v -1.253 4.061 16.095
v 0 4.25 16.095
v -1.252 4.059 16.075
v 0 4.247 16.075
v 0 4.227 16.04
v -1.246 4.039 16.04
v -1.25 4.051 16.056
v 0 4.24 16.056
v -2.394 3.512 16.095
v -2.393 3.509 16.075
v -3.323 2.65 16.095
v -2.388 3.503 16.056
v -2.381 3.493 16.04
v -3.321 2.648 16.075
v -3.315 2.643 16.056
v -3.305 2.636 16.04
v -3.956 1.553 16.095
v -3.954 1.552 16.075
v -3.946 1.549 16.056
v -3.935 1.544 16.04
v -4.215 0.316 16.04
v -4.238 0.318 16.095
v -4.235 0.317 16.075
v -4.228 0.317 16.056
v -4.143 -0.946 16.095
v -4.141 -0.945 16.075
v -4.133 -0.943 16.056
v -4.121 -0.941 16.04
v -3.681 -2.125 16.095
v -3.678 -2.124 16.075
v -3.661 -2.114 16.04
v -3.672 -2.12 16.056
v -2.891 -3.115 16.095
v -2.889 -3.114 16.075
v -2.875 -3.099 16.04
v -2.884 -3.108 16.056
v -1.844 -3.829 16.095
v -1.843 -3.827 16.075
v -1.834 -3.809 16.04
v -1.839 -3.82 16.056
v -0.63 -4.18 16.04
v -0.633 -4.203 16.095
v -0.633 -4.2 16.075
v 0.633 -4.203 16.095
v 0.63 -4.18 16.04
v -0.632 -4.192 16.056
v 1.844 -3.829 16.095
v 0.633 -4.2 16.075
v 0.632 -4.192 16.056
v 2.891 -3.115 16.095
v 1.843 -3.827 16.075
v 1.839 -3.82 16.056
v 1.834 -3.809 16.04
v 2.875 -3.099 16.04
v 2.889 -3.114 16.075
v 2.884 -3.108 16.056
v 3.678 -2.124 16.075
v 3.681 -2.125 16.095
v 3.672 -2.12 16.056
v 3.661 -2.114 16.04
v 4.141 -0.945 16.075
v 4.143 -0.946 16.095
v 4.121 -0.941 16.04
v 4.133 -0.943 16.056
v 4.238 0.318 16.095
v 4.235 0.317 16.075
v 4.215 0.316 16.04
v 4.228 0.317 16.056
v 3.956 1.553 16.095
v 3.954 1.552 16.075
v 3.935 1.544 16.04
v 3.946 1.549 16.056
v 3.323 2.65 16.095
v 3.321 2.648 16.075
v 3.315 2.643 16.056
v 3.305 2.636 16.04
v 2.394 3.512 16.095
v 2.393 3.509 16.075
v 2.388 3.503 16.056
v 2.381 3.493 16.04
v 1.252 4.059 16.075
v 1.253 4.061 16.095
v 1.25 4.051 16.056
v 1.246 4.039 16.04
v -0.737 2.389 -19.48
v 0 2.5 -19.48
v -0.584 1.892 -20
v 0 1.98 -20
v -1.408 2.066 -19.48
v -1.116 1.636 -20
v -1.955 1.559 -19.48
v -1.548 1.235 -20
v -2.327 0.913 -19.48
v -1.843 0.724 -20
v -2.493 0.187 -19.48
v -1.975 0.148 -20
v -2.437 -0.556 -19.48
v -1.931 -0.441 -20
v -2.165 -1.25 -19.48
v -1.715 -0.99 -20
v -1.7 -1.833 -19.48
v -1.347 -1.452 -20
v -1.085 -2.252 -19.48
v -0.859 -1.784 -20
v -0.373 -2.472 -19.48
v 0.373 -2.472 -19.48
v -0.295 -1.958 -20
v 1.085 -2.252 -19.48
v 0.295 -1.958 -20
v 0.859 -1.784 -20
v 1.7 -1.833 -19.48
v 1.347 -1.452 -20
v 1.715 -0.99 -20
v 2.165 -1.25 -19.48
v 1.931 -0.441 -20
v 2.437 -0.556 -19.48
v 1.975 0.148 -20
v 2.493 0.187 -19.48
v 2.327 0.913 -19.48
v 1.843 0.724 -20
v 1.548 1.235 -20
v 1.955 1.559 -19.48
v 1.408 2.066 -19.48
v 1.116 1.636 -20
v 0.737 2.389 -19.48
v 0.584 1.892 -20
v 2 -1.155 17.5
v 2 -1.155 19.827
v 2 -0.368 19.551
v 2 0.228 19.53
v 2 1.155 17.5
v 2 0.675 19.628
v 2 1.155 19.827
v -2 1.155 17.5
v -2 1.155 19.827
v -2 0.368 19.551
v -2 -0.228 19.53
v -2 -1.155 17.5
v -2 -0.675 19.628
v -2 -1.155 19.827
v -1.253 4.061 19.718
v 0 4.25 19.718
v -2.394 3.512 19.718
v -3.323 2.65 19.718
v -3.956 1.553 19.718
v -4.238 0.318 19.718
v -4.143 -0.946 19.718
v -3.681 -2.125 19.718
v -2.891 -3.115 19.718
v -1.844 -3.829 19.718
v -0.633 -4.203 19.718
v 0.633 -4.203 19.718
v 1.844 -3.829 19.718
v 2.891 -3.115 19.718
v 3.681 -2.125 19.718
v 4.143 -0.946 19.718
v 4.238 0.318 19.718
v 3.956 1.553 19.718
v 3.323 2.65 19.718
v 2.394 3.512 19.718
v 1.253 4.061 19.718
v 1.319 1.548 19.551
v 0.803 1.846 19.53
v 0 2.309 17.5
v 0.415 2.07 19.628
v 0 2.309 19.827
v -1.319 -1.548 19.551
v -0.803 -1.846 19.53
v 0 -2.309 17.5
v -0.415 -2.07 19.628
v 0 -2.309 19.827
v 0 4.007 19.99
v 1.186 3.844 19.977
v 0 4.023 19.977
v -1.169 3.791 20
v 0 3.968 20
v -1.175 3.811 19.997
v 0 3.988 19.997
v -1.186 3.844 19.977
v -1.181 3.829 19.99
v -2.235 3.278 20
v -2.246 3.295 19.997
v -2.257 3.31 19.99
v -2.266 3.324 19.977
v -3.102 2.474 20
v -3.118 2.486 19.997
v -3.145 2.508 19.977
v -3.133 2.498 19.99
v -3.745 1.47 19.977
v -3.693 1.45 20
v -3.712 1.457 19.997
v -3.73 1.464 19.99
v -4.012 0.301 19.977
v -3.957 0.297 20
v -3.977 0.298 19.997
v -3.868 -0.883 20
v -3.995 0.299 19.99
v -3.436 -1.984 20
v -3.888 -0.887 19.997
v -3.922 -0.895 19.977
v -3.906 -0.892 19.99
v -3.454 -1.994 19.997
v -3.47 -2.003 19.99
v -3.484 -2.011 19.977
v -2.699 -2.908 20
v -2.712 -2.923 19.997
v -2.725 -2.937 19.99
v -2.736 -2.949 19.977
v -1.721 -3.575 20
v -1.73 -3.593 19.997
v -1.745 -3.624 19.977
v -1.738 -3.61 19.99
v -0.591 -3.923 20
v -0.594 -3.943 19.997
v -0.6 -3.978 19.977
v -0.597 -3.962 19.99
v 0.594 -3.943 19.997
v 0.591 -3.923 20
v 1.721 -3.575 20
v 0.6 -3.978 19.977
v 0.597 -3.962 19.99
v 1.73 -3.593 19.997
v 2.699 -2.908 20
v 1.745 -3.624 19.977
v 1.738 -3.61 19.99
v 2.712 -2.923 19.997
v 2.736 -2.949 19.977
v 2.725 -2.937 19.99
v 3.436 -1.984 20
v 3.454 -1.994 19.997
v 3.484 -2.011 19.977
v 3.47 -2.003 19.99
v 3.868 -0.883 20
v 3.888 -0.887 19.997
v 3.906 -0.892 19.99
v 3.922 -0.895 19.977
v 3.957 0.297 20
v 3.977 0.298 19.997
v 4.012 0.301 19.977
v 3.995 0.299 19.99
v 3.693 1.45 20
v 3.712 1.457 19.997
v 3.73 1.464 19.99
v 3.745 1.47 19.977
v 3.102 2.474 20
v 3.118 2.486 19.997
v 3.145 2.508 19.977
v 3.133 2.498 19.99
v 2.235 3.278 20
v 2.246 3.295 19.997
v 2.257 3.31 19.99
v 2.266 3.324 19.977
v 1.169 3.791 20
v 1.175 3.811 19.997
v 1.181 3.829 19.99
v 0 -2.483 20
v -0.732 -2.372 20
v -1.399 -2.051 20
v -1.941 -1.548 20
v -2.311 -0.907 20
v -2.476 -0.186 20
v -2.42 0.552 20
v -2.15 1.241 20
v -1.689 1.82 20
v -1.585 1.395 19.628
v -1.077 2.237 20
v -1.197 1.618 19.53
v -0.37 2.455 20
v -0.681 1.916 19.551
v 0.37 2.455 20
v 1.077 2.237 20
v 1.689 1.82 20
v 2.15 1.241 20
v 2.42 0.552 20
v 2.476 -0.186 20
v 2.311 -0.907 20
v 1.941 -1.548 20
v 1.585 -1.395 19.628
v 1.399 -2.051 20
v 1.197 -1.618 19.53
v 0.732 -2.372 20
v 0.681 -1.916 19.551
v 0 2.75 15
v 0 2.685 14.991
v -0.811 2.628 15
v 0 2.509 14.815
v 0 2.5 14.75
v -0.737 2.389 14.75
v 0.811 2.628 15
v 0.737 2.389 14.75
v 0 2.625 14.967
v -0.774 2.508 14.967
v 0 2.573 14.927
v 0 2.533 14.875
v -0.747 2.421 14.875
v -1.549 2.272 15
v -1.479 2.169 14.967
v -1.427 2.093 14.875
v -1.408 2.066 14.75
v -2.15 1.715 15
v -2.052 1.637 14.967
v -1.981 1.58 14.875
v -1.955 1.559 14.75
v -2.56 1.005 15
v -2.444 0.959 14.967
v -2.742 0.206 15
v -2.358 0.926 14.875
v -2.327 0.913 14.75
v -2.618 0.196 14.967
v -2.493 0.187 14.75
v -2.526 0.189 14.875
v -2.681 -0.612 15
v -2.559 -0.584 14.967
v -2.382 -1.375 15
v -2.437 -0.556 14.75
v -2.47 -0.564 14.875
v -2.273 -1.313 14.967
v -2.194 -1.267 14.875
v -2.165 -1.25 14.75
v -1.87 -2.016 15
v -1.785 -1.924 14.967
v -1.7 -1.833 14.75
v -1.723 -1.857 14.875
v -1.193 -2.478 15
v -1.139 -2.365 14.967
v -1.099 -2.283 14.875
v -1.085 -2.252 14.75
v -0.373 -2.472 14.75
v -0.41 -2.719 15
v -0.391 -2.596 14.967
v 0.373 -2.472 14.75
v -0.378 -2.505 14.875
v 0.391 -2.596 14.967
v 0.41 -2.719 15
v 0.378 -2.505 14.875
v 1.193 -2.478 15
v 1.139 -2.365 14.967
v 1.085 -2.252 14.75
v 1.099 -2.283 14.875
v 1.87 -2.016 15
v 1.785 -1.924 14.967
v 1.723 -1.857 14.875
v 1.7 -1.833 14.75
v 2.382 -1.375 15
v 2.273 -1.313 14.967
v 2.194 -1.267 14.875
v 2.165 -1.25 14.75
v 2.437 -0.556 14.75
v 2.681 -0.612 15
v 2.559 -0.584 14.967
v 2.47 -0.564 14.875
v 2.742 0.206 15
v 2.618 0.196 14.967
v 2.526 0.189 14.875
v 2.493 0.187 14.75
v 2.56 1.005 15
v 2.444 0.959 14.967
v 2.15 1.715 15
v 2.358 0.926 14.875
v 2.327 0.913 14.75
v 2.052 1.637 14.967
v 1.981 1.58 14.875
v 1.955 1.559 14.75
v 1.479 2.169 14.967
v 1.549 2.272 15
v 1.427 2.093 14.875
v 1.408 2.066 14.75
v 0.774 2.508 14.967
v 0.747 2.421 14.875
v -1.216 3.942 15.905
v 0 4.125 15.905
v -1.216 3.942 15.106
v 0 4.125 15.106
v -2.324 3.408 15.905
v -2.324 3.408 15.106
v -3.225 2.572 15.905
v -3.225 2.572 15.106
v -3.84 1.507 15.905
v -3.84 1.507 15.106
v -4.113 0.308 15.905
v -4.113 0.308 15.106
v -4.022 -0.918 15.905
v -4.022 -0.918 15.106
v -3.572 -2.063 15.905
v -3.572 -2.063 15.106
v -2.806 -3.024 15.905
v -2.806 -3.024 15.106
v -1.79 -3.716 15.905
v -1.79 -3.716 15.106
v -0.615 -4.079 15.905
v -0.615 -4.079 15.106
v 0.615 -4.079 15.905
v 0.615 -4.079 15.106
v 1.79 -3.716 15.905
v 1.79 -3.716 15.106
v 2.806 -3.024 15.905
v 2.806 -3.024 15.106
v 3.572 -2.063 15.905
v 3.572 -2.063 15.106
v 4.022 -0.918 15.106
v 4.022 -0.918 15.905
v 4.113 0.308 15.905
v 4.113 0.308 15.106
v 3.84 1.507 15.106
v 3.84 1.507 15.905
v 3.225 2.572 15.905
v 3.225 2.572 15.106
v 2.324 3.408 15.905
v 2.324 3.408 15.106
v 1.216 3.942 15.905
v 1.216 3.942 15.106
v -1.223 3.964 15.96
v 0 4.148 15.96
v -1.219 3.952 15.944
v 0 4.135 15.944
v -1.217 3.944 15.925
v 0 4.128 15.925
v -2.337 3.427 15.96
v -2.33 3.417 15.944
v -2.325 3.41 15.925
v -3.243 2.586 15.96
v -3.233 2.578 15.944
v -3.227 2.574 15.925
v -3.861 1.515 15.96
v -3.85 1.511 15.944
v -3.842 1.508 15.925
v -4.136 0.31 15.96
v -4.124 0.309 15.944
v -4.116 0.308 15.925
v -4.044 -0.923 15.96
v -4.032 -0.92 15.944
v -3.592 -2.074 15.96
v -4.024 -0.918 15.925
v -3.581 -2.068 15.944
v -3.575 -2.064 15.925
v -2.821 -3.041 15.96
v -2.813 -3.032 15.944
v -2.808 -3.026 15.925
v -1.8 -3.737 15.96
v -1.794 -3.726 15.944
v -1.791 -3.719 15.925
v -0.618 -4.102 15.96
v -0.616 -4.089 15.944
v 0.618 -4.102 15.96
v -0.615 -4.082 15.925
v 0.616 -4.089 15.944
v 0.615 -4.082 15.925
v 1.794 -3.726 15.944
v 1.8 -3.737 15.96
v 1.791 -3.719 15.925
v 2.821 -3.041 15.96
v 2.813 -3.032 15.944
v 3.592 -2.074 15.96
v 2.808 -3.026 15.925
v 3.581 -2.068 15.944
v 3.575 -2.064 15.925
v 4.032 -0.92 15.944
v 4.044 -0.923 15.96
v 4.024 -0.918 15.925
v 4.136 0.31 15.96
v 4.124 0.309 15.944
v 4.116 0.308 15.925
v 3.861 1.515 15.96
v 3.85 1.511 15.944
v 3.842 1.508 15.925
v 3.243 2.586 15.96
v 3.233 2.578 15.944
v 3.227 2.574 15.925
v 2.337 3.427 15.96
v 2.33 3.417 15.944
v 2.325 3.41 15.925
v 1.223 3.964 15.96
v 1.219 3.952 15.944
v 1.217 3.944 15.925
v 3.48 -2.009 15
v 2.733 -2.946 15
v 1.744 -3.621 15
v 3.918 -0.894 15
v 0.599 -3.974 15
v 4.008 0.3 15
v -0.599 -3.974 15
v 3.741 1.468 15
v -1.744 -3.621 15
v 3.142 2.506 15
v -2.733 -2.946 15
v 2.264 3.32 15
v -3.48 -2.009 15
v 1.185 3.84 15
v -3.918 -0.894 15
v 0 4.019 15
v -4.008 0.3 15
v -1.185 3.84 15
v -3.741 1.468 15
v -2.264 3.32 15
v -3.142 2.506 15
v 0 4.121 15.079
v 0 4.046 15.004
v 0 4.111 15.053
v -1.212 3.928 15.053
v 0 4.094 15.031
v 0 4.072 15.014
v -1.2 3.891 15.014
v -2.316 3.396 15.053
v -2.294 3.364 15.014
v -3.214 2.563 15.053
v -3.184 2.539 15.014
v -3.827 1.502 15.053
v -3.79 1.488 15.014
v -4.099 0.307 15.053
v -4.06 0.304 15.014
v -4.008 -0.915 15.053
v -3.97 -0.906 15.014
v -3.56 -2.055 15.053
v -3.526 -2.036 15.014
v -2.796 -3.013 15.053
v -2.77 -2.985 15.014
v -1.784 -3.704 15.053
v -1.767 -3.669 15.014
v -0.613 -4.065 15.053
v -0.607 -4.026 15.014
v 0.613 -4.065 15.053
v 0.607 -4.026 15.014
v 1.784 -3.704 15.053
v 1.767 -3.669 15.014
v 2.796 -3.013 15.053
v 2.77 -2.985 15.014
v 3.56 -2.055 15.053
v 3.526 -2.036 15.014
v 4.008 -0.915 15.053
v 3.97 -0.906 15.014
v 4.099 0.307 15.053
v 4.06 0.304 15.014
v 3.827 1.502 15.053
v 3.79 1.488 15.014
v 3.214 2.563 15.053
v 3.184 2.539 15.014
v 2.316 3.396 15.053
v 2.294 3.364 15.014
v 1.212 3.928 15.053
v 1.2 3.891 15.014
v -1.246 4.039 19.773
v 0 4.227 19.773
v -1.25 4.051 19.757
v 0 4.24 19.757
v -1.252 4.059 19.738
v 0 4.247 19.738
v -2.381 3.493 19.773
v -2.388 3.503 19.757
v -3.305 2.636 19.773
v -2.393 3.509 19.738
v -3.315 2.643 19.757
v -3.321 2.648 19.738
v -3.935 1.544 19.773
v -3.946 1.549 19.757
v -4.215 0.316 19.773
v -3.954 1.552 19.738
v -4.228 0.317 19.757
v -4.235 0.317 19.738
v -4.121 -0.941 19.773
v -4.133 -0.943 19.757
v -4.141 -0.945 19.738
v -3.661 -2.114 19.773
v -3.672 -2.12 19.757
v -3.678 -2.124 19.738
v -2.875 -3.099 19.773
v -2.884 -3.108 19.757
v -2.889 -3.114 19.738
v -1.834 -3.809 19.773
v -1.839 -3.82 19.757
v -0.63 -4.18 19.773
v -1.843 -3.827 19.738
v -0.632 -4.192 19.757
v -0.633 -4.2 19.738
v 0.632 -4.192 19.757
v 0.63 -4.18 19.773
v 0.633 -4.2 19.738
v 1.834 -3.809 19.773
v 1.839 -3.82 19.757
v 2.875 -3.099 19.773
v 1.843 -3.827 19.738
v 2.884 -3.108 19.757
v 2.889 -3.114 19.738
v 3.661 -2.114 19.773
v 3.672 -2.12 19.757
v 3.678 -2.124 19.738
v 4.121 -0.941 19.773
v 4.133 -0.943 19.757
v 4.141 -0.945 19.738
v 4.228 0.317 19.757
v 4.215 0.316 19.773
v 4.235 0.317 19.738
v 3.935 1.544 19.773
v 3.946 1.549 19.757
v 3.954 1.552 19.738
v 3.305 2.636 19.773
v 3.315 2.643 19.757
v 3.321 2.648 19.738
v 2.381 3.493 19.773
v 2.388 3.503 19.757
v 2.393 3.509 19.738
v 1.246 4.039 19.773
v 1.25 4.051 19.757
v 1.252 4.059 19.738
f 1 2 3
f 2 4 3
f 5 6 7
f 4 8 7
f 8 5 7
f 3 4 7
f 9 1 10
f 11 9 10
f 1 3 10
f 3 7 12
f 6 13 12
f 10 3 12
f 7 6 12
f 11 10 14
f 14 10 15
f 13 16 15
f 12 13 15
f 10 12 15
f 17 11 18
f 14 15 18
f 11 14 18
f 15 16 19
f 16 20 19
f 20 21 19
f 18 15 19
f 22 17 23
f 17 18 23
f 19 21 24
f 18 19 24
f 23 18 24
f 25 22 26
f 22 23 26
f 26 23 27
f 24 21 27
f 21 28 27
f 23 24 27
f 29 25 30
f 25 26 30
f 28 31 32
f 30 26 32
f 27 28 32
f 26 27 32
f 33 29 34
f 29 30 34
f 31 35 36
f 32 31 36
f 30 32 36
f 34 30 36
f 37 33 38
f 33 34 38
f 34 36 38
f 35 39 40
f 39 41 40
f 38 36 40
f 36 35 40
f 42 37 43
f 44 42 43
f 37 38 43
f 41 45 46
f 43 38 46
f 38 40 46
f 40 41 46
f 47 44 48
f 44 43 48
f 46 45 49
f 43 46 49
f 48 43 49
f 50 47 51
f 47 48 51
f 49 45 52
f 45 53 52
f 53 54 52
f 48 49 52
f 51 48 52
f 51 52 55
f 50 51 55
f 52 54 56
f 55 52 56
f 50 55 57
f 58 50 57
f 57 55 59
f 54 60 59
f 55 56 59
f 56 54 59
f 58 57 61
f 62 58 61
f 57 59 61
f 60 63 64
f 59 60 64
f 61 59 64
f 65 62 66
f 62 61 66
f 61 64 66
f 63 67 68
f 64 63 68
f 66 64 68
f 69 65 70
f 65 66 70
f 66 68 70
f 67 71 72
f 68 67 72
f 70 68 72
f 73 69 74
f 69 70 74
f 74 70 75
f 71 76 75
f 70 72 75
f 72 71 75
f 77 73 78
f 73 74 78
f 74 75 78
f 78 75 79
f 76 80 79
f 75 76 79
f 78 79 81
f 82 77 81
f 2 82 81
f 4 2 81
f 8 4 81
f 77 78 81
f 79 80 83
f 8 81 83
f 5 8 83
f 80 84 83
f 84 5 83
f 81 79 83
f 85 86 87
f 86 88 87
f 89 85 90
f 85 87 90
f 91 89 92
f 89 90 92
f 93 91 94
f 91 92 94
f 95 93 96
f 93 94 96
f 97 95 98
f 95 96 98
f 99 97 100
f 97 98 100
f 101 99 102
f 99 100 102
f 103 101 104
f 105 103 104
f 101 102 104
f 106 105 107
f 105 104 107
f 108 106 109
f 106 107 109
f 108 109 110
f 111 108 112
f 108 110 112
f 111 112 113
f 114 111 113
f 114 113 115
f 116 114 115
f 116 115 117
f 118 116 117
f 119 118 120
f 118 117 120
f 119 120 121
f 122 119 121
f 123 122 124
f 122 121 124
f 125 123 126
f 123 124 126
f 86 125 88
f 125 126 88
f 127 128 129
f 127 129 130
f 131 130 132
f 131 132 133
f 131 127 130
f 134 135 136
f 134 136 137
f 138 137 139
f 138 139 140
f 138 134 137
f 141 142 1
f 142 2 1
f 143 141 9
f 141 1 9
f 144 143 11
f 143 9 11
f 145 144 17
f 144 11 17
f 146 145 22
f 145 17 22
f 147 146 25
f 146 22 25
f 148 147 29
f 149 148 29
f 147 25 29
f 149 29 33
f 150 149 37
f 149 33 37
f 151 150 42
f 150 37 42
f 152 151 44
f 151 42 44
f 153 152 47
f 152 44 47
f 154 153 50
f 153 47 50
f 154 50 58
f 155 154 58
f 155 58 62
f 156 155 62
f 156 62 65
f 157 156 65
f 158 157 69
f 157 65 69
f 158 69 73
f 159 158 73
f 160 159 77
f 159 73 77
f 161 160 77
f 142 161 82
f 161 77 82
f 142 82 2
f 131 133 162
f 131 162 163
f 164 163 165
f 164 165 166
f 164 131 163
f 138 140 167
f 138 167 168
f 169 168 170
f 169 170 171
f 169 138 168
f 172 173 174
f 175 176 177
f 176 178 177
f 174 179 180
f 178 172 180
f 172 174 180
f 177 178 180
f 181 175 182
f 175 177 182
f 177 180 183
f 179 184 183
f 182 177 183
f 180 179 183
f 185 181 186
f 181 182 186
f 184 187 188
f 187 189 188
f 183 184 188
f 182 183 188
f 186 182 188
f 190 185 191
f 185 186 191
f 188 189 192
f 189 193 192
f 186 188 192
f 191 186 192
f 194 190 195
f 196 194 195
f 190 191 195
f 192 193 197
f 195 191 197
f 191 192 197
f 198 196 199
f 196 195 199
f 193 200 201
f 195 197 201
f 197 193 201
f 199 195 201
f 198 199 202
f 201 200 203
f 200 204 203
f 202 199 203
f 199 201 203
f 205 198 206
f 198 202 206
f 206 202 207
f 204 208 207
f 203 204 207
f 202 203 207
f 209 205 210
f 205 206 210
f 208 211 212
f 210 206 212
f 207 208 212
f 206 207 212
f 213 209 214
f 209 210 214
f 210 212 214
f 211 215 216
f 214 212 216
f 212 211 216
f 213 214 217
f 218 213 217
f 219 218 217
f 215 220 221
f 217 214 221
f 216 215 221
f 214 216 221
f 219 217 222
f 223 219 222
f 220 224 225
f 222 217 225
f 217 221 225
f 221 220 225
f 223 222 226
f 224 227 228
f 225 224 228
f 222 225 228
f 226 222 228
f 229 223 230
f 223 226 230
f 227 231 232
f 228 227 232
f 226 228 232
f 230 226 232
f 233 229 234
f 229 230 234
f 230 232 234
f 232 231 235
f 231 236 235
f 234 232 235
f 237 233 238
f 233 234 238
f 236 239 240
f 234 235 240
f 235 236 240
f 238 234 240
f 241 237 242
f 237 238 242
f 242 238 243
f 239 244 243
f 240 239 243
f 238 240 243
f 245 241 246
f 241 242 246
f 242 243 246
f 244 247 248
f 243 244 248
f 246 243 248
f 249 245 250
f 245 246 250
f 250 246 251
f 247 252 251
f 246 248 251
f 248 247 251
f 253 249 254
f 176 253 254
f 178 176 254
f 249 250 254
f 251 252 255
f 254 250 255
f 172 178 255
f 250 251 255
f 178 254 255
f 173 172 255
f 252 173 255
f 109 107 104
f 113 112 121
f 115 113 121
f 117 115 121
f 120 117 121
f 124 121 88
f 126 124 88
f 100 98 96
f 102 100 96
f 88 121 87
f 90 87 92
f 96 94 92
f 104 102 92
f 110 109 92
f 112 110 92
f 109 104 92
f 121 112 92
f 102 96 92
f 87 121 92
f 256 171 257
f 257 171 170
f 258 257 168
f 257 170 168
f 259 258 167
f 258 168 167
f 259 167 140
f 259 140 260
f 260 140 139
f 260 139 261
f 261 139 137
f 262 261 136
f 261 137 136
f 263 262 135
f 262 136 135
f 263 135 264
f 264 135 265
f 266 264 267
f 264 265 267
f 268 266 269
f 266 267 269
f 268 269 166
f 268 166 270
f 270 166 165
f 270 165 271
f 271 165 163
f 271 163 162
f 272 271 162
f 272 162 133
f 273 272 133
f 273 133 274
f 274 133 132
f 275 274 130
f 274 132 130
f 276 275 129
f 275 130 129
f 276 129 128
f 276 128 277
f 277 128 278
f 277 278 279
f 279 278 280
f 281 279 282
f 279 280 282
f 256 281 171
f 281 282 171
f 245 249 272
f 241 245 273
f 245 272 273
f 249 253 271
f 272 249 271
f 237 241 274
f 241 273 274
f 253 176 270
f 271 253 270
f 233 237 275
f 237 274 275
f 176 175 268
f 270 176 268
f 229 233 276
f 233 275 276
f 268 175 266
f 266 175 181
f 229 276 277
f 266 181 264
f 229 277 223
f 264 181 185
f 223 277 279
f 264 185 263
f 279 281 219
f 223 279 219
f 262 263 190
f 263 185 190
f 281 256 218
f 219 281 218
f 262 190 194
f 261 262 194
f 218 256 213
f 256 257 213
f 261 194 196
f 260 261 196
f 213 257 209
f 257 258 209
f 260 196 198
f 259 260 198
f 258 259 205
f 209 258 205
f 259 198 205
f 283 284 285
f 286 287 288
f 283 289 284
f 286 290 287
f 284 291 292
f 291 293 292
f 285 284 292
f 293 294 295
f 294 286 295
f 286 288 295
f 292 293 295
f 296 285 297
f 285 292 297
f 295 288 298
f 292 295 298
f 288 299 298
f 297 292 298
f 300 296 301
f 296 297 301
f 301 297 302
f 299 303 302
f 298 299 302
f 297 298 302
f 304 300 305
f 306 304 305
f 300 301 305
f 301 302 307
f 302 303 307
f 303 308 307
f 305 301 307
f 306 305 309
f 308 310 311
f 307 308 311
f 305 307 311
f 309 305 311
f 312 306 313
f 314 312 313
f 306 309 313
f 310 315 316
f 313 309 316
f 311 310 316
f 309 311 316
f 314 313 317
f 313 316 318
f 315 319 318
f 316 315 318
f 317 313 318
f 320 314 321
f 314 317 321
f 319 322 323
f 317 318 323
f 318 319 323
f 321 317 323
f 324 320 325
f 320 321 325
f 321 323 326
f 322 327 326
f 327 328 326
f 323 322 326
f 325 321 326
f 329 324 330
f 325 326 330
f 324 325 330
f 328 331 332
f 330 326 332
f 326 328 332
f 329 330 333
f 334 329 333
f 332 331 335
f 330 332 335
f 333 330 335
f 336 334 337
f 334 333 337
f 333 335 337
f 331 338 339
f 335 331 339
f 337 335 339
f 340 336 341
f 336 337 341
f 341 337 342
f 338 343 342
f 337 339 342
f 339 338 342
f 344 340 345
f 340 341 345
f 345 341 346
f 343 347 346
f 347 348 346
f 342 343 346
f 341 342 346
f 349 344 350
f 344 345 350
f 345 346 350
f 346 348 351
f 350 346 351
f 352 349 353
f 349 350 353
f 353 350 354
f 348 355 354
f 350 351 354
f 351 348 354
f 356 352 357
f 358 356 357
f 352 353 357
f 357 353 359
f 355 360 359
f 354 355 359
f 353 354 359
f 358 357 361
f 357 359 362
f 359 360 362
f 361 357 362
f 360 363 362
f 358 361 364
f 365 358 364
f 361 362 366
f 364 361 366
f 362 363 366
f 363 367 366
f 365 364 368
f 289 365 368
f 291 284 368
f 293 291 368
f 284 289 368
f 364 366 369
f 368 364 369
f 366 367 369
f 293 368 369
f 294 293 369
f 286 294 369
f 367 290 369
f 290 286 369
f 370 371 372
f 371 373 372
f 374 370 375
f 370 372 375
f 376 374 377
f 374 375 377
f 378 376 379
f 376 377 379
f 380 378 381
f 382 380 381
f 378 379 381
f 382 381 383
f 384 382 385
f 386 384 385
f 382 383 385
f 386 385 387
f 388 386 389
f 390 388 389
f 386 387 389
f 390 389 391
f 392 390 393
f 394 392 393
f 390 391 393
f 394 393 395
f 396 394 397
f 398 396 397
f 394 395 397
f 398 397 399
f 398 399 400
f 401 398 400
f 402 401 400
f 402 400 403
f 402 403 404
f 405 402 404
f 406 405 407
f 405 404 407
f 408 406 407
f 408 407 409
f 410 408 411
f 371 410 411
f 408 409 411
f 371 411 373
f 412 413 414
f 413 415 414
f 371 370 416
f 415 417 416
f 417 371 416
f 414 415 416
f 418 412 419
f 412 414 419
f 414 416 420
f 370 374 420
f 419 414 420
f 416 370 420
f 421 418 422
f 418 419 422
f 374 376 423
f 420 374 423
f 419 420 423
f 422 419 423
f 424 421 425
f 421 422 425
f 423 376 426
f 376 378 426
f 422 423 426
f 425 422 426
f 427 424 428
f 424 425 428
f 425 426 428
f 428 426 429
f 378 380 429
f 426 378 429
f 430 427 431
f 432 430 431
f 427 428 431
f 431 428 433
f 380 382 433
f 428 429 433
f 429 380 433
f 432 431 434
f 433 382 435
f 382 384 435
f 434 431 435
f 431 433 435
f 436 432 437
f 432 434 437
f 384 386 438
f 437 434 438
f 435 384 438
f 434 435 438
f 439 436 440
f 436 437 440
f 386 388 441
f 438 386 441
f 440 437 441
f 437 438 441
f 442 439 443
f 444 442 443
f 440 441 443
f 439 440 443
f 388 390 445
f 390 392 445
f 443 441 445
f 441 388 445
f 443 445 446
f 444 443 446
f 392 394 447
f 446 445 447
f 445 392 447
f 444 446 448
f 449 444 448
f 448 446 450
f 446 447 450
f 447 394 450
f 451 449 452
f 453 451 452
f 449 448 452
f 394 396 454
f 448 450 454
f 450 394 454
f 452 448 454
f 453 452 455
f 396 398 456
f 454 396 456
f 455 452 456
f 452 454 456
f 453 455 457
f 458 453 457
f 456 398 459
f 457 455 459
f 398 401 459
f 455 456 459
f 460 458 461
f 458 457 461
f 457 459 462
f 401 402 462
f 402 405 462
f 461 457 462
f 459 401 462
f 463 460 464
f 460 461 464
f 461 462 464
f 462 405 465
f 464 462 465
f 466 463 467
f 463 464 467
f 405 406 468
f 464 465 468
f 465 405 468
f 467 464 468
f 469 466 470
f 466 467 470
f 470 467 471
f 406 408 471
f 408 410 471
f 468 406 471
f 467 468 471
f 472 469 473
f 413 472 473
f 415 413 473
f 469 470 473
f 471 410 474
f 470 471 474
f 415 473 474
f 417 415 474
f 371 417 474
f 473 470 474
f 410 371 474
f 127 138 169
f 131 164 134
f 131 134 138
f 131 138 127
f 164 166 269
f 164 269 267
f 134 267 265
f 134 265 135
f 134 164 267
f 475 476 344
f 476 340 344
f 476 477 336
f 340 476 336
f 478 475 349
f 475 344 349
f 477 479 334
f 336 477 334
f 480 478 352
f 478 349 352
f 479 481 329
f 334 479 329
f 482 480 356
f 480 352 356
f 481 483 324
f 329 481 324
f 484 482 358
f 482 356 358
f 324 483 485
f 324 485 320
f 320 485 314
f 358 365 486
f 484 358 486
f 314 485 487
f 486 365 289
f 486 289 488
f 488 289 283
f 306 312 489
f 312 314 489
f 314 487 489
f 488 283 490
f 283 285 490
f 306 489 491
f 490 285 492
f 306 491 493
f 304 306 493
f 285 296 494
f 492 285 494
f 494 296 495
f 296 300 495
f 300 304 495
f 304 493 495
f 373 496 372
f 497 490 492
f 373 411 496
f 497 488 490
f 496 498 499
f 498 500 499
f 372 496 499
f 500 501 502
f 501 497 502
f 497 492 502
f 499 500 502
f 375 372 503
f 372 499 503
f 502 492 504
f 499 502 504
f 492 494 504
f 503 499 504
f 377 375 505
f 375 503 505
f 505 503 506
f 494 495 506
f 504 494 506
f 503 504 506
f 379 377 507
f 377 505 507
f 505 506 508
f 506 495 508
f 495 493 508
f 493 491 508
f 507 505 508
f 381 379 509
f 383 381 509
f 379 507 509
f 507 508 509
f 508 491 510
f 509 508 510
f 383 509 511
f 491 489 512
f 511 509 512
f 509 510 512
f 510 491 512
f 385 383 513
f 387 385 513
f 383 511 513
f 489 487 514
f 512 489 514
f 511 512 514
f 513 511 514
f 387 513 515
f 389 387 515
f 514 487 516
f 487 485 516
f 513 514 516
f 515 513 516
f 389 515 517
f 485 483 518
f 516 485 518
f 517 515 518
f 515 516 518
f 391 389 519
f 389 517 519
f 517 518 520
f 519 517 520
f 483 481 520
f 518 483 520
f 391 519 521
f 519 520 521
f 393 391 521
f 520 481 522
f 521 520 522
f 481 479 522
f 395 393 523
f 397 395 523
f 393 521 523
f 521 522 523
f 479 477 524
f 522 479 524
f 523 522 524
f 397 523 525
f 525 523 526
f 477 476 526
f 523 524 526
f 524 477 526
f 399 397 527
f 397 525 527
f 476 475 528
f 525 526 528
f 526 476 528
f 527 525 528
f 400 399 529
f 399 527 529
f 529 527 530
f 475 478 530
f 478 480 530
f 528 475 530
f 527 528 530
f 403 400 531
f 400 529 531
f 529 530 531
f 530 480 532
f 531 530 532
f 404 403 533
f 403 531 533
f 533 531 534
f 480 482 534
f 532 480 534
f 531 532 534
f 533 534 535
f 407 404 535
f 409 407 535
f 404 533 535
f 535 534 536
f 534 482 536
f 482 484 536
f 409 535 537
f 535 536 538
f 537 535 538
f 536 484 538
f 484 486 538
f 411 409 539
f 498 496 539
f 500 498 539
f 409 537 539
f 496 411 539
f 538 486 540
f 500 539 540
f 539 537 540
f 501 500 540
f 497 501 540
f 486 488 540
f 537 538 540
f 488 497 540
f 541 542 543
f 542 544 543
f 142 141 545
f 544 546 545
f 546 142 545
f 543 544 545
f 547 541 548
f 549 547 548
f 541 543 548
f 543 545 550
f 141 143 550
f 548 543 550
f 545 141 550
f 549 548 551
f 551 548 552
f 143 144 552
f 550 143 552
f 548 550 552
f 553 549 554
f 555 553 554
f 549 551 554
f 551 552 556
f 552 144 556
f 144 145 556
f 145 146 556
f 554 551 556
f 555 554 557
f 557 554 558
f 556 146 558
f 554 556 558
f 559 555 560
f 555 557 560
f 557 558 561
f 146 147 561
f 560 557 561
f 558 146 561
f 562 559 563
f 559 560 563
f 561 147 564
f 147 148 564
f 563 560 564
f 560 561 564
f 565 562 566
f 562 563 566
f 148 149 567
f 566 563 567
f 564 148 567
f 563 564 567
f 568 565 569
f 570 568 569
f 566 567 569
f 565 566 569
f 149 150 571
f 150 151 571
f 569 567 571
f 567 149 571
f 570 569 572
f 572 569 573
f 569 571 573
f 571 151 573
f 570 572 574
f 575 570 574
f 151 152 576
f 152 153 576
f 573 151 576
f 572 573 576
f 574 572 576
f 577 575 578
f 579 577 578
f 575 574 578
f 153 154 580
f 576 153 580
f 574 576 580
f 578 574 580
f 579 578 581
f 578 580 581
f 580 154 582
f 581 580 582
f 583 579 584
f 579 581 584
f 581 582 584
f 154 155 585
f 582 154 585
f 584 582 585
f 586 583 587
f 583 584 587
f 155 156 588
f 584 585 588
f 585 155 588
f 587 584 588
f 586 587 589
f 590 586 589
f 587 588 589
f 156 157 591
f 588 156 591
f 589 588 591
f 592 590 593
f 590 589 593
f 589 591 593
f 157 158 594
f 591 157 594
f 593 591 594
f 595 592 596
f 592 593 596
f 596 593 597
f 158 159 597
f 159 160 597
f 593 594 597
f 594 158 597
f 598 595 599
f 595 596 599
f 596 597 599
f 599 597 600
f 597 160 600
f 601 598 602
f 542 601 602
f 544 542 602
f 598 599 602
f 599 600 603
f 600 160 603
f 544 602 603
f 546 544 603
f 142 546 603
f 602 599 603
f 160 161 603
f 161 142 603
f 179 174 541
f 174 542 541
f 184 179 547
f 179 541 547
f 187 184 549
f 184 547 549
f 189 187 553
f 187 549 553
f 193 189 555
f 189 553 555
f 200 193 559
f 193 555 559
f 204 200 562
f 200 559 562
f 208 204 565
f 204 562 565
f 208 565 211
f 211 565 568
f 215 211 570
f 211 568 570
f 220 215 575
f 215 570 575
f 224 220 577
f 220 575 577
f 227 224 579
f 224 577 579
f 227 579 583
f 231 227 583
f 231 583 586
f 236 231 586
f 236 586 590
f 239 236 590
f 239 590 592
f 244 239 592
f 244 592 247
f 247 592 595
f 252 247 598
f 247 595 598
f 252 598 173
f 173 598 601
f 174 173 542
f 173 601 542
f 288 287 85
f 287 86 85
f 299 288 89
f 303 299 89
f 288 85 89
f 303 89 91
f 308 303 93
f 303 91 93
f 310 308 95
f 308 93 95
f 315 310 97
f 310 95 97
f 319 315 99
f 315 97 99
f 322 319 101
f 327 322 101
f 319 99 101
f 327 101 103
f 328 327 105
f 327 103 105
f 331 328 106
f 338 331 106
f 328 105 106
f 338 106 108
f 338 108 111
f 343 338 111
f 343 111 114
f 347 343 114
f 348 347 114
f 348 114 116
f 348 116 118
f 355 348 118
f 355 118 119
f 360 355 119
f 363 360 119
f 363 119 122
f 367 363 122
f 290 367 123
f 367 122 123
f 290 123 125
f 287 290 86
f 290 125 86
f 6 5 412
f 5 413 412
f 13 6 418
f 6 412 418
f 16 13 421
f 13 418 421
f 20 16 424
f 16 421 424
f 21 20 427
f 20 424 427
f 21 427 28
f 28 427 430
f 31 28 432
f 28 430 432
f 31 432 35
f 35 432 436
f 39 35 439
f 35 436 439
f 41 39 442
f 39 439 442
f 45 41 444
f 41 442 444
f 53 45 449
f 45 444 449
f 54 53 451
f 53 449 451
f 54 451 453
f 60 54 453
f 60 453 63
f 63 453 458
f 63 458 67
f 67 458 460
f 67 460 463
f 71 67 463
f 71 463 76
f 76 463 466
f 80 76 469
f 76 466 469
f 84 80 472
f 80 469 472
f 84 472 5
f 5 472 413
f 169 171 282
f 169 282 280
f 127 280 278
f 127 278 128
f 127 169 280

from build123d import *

# Parameters (mm, degrees)
CUT_EXTRUDE1_START = -2.5
CUT_EXTRUDE1_DEPTH = 2.5


with BuildPart() as part:
    # Sketch2 → Revolve1 (revolve)
    with BuildSketch(Plane(origin=(0, 0, 0), x_dir=(0, 0, -1), z_dir=(1, 0, 0))):
        with BuildLine():
            Line((-20, 0), (-20, 3.967639565))
            ThreePointArc((-20, 3.967639565), (-19.994053088, 3.997536709), (-19.977117717, 4.022882283))
            Line((-19.977117717, 4.022882283), (-19.772882283, 4.227117717))
            ThreePointArc((-19.772882283, 4.227117717), (-19.747536709, 4.244053088), (-19.717639565, 4.25))
            Line((-19.717639565, 4.25), (-16.094860435, 4.25))
            ThreePointArc((-16.094860435, 4.25), (-16.064963291, 4.244053088), (-16.039617717, 4.227117717))
            Line((-16.039617717, 4.227117717), (-15.960382283, 4.147882283))
            ThreePointArc((-15.960382283, 4.147882283), (-15.935036709, 4.130946912), (-15.905139565, 4.125))
            Line((-15.905139565, 4.125), (-15.10625, 4.125))
            ThreePointArc((-15.10625, 4.125), (-15.031119904, 4.093880096), (-15, 4.01875))
            Line((-15, 4.01875), (-15, 2.75))
            ThreePointArc((-15, 2.75), (-14.926776695, 2.573223305), (-14.75, 2.5))
            Line((-14.75, 2.5), (19.480384758, 2.5))
            Line((19.480384758, 2.5), (20, 1.980384758))
            Line((20, 1.980384758), (20, 0))
            Line((20, 0), (-20, 0))
        make_face()
    revolve(axis=Axis((0, 0, -20), (0, 0, 1)))

    # Sketch3 → Cut-Extrude1 (cut)
    with BuildSketch(Plane.XY.offset(20).offset(CUT_EXTRUDE1_START)):
        Polygon((2, -1.154700538), (2, 1.154700538), (0, 2.309401077), (-2, 1.154700538), (-2, -1.154700538), (0, -2.309401077), align=None)
    extrude(amount=CUT_EXTRUDE1_DEPTH, mode=Mode.SUBTRACT)

    # Cut-Extrude2 cone 1 section (through the dimple's axis) → Cut-Extrude2 (revolve, cut)
    with BuildSketch(Plane(origin=(0, 0, 20), x_dir=(0, -1, 0), z_dir=(1, 0, 0))):
        Polygon((0, 0), (2.482606158, 0), (0, 2.482606158), align=None)
    revolve(axis=Axis((0, 0, 20), (0, 0, -1)), mode=Mode.SUBTRACT)


solid = part.part
